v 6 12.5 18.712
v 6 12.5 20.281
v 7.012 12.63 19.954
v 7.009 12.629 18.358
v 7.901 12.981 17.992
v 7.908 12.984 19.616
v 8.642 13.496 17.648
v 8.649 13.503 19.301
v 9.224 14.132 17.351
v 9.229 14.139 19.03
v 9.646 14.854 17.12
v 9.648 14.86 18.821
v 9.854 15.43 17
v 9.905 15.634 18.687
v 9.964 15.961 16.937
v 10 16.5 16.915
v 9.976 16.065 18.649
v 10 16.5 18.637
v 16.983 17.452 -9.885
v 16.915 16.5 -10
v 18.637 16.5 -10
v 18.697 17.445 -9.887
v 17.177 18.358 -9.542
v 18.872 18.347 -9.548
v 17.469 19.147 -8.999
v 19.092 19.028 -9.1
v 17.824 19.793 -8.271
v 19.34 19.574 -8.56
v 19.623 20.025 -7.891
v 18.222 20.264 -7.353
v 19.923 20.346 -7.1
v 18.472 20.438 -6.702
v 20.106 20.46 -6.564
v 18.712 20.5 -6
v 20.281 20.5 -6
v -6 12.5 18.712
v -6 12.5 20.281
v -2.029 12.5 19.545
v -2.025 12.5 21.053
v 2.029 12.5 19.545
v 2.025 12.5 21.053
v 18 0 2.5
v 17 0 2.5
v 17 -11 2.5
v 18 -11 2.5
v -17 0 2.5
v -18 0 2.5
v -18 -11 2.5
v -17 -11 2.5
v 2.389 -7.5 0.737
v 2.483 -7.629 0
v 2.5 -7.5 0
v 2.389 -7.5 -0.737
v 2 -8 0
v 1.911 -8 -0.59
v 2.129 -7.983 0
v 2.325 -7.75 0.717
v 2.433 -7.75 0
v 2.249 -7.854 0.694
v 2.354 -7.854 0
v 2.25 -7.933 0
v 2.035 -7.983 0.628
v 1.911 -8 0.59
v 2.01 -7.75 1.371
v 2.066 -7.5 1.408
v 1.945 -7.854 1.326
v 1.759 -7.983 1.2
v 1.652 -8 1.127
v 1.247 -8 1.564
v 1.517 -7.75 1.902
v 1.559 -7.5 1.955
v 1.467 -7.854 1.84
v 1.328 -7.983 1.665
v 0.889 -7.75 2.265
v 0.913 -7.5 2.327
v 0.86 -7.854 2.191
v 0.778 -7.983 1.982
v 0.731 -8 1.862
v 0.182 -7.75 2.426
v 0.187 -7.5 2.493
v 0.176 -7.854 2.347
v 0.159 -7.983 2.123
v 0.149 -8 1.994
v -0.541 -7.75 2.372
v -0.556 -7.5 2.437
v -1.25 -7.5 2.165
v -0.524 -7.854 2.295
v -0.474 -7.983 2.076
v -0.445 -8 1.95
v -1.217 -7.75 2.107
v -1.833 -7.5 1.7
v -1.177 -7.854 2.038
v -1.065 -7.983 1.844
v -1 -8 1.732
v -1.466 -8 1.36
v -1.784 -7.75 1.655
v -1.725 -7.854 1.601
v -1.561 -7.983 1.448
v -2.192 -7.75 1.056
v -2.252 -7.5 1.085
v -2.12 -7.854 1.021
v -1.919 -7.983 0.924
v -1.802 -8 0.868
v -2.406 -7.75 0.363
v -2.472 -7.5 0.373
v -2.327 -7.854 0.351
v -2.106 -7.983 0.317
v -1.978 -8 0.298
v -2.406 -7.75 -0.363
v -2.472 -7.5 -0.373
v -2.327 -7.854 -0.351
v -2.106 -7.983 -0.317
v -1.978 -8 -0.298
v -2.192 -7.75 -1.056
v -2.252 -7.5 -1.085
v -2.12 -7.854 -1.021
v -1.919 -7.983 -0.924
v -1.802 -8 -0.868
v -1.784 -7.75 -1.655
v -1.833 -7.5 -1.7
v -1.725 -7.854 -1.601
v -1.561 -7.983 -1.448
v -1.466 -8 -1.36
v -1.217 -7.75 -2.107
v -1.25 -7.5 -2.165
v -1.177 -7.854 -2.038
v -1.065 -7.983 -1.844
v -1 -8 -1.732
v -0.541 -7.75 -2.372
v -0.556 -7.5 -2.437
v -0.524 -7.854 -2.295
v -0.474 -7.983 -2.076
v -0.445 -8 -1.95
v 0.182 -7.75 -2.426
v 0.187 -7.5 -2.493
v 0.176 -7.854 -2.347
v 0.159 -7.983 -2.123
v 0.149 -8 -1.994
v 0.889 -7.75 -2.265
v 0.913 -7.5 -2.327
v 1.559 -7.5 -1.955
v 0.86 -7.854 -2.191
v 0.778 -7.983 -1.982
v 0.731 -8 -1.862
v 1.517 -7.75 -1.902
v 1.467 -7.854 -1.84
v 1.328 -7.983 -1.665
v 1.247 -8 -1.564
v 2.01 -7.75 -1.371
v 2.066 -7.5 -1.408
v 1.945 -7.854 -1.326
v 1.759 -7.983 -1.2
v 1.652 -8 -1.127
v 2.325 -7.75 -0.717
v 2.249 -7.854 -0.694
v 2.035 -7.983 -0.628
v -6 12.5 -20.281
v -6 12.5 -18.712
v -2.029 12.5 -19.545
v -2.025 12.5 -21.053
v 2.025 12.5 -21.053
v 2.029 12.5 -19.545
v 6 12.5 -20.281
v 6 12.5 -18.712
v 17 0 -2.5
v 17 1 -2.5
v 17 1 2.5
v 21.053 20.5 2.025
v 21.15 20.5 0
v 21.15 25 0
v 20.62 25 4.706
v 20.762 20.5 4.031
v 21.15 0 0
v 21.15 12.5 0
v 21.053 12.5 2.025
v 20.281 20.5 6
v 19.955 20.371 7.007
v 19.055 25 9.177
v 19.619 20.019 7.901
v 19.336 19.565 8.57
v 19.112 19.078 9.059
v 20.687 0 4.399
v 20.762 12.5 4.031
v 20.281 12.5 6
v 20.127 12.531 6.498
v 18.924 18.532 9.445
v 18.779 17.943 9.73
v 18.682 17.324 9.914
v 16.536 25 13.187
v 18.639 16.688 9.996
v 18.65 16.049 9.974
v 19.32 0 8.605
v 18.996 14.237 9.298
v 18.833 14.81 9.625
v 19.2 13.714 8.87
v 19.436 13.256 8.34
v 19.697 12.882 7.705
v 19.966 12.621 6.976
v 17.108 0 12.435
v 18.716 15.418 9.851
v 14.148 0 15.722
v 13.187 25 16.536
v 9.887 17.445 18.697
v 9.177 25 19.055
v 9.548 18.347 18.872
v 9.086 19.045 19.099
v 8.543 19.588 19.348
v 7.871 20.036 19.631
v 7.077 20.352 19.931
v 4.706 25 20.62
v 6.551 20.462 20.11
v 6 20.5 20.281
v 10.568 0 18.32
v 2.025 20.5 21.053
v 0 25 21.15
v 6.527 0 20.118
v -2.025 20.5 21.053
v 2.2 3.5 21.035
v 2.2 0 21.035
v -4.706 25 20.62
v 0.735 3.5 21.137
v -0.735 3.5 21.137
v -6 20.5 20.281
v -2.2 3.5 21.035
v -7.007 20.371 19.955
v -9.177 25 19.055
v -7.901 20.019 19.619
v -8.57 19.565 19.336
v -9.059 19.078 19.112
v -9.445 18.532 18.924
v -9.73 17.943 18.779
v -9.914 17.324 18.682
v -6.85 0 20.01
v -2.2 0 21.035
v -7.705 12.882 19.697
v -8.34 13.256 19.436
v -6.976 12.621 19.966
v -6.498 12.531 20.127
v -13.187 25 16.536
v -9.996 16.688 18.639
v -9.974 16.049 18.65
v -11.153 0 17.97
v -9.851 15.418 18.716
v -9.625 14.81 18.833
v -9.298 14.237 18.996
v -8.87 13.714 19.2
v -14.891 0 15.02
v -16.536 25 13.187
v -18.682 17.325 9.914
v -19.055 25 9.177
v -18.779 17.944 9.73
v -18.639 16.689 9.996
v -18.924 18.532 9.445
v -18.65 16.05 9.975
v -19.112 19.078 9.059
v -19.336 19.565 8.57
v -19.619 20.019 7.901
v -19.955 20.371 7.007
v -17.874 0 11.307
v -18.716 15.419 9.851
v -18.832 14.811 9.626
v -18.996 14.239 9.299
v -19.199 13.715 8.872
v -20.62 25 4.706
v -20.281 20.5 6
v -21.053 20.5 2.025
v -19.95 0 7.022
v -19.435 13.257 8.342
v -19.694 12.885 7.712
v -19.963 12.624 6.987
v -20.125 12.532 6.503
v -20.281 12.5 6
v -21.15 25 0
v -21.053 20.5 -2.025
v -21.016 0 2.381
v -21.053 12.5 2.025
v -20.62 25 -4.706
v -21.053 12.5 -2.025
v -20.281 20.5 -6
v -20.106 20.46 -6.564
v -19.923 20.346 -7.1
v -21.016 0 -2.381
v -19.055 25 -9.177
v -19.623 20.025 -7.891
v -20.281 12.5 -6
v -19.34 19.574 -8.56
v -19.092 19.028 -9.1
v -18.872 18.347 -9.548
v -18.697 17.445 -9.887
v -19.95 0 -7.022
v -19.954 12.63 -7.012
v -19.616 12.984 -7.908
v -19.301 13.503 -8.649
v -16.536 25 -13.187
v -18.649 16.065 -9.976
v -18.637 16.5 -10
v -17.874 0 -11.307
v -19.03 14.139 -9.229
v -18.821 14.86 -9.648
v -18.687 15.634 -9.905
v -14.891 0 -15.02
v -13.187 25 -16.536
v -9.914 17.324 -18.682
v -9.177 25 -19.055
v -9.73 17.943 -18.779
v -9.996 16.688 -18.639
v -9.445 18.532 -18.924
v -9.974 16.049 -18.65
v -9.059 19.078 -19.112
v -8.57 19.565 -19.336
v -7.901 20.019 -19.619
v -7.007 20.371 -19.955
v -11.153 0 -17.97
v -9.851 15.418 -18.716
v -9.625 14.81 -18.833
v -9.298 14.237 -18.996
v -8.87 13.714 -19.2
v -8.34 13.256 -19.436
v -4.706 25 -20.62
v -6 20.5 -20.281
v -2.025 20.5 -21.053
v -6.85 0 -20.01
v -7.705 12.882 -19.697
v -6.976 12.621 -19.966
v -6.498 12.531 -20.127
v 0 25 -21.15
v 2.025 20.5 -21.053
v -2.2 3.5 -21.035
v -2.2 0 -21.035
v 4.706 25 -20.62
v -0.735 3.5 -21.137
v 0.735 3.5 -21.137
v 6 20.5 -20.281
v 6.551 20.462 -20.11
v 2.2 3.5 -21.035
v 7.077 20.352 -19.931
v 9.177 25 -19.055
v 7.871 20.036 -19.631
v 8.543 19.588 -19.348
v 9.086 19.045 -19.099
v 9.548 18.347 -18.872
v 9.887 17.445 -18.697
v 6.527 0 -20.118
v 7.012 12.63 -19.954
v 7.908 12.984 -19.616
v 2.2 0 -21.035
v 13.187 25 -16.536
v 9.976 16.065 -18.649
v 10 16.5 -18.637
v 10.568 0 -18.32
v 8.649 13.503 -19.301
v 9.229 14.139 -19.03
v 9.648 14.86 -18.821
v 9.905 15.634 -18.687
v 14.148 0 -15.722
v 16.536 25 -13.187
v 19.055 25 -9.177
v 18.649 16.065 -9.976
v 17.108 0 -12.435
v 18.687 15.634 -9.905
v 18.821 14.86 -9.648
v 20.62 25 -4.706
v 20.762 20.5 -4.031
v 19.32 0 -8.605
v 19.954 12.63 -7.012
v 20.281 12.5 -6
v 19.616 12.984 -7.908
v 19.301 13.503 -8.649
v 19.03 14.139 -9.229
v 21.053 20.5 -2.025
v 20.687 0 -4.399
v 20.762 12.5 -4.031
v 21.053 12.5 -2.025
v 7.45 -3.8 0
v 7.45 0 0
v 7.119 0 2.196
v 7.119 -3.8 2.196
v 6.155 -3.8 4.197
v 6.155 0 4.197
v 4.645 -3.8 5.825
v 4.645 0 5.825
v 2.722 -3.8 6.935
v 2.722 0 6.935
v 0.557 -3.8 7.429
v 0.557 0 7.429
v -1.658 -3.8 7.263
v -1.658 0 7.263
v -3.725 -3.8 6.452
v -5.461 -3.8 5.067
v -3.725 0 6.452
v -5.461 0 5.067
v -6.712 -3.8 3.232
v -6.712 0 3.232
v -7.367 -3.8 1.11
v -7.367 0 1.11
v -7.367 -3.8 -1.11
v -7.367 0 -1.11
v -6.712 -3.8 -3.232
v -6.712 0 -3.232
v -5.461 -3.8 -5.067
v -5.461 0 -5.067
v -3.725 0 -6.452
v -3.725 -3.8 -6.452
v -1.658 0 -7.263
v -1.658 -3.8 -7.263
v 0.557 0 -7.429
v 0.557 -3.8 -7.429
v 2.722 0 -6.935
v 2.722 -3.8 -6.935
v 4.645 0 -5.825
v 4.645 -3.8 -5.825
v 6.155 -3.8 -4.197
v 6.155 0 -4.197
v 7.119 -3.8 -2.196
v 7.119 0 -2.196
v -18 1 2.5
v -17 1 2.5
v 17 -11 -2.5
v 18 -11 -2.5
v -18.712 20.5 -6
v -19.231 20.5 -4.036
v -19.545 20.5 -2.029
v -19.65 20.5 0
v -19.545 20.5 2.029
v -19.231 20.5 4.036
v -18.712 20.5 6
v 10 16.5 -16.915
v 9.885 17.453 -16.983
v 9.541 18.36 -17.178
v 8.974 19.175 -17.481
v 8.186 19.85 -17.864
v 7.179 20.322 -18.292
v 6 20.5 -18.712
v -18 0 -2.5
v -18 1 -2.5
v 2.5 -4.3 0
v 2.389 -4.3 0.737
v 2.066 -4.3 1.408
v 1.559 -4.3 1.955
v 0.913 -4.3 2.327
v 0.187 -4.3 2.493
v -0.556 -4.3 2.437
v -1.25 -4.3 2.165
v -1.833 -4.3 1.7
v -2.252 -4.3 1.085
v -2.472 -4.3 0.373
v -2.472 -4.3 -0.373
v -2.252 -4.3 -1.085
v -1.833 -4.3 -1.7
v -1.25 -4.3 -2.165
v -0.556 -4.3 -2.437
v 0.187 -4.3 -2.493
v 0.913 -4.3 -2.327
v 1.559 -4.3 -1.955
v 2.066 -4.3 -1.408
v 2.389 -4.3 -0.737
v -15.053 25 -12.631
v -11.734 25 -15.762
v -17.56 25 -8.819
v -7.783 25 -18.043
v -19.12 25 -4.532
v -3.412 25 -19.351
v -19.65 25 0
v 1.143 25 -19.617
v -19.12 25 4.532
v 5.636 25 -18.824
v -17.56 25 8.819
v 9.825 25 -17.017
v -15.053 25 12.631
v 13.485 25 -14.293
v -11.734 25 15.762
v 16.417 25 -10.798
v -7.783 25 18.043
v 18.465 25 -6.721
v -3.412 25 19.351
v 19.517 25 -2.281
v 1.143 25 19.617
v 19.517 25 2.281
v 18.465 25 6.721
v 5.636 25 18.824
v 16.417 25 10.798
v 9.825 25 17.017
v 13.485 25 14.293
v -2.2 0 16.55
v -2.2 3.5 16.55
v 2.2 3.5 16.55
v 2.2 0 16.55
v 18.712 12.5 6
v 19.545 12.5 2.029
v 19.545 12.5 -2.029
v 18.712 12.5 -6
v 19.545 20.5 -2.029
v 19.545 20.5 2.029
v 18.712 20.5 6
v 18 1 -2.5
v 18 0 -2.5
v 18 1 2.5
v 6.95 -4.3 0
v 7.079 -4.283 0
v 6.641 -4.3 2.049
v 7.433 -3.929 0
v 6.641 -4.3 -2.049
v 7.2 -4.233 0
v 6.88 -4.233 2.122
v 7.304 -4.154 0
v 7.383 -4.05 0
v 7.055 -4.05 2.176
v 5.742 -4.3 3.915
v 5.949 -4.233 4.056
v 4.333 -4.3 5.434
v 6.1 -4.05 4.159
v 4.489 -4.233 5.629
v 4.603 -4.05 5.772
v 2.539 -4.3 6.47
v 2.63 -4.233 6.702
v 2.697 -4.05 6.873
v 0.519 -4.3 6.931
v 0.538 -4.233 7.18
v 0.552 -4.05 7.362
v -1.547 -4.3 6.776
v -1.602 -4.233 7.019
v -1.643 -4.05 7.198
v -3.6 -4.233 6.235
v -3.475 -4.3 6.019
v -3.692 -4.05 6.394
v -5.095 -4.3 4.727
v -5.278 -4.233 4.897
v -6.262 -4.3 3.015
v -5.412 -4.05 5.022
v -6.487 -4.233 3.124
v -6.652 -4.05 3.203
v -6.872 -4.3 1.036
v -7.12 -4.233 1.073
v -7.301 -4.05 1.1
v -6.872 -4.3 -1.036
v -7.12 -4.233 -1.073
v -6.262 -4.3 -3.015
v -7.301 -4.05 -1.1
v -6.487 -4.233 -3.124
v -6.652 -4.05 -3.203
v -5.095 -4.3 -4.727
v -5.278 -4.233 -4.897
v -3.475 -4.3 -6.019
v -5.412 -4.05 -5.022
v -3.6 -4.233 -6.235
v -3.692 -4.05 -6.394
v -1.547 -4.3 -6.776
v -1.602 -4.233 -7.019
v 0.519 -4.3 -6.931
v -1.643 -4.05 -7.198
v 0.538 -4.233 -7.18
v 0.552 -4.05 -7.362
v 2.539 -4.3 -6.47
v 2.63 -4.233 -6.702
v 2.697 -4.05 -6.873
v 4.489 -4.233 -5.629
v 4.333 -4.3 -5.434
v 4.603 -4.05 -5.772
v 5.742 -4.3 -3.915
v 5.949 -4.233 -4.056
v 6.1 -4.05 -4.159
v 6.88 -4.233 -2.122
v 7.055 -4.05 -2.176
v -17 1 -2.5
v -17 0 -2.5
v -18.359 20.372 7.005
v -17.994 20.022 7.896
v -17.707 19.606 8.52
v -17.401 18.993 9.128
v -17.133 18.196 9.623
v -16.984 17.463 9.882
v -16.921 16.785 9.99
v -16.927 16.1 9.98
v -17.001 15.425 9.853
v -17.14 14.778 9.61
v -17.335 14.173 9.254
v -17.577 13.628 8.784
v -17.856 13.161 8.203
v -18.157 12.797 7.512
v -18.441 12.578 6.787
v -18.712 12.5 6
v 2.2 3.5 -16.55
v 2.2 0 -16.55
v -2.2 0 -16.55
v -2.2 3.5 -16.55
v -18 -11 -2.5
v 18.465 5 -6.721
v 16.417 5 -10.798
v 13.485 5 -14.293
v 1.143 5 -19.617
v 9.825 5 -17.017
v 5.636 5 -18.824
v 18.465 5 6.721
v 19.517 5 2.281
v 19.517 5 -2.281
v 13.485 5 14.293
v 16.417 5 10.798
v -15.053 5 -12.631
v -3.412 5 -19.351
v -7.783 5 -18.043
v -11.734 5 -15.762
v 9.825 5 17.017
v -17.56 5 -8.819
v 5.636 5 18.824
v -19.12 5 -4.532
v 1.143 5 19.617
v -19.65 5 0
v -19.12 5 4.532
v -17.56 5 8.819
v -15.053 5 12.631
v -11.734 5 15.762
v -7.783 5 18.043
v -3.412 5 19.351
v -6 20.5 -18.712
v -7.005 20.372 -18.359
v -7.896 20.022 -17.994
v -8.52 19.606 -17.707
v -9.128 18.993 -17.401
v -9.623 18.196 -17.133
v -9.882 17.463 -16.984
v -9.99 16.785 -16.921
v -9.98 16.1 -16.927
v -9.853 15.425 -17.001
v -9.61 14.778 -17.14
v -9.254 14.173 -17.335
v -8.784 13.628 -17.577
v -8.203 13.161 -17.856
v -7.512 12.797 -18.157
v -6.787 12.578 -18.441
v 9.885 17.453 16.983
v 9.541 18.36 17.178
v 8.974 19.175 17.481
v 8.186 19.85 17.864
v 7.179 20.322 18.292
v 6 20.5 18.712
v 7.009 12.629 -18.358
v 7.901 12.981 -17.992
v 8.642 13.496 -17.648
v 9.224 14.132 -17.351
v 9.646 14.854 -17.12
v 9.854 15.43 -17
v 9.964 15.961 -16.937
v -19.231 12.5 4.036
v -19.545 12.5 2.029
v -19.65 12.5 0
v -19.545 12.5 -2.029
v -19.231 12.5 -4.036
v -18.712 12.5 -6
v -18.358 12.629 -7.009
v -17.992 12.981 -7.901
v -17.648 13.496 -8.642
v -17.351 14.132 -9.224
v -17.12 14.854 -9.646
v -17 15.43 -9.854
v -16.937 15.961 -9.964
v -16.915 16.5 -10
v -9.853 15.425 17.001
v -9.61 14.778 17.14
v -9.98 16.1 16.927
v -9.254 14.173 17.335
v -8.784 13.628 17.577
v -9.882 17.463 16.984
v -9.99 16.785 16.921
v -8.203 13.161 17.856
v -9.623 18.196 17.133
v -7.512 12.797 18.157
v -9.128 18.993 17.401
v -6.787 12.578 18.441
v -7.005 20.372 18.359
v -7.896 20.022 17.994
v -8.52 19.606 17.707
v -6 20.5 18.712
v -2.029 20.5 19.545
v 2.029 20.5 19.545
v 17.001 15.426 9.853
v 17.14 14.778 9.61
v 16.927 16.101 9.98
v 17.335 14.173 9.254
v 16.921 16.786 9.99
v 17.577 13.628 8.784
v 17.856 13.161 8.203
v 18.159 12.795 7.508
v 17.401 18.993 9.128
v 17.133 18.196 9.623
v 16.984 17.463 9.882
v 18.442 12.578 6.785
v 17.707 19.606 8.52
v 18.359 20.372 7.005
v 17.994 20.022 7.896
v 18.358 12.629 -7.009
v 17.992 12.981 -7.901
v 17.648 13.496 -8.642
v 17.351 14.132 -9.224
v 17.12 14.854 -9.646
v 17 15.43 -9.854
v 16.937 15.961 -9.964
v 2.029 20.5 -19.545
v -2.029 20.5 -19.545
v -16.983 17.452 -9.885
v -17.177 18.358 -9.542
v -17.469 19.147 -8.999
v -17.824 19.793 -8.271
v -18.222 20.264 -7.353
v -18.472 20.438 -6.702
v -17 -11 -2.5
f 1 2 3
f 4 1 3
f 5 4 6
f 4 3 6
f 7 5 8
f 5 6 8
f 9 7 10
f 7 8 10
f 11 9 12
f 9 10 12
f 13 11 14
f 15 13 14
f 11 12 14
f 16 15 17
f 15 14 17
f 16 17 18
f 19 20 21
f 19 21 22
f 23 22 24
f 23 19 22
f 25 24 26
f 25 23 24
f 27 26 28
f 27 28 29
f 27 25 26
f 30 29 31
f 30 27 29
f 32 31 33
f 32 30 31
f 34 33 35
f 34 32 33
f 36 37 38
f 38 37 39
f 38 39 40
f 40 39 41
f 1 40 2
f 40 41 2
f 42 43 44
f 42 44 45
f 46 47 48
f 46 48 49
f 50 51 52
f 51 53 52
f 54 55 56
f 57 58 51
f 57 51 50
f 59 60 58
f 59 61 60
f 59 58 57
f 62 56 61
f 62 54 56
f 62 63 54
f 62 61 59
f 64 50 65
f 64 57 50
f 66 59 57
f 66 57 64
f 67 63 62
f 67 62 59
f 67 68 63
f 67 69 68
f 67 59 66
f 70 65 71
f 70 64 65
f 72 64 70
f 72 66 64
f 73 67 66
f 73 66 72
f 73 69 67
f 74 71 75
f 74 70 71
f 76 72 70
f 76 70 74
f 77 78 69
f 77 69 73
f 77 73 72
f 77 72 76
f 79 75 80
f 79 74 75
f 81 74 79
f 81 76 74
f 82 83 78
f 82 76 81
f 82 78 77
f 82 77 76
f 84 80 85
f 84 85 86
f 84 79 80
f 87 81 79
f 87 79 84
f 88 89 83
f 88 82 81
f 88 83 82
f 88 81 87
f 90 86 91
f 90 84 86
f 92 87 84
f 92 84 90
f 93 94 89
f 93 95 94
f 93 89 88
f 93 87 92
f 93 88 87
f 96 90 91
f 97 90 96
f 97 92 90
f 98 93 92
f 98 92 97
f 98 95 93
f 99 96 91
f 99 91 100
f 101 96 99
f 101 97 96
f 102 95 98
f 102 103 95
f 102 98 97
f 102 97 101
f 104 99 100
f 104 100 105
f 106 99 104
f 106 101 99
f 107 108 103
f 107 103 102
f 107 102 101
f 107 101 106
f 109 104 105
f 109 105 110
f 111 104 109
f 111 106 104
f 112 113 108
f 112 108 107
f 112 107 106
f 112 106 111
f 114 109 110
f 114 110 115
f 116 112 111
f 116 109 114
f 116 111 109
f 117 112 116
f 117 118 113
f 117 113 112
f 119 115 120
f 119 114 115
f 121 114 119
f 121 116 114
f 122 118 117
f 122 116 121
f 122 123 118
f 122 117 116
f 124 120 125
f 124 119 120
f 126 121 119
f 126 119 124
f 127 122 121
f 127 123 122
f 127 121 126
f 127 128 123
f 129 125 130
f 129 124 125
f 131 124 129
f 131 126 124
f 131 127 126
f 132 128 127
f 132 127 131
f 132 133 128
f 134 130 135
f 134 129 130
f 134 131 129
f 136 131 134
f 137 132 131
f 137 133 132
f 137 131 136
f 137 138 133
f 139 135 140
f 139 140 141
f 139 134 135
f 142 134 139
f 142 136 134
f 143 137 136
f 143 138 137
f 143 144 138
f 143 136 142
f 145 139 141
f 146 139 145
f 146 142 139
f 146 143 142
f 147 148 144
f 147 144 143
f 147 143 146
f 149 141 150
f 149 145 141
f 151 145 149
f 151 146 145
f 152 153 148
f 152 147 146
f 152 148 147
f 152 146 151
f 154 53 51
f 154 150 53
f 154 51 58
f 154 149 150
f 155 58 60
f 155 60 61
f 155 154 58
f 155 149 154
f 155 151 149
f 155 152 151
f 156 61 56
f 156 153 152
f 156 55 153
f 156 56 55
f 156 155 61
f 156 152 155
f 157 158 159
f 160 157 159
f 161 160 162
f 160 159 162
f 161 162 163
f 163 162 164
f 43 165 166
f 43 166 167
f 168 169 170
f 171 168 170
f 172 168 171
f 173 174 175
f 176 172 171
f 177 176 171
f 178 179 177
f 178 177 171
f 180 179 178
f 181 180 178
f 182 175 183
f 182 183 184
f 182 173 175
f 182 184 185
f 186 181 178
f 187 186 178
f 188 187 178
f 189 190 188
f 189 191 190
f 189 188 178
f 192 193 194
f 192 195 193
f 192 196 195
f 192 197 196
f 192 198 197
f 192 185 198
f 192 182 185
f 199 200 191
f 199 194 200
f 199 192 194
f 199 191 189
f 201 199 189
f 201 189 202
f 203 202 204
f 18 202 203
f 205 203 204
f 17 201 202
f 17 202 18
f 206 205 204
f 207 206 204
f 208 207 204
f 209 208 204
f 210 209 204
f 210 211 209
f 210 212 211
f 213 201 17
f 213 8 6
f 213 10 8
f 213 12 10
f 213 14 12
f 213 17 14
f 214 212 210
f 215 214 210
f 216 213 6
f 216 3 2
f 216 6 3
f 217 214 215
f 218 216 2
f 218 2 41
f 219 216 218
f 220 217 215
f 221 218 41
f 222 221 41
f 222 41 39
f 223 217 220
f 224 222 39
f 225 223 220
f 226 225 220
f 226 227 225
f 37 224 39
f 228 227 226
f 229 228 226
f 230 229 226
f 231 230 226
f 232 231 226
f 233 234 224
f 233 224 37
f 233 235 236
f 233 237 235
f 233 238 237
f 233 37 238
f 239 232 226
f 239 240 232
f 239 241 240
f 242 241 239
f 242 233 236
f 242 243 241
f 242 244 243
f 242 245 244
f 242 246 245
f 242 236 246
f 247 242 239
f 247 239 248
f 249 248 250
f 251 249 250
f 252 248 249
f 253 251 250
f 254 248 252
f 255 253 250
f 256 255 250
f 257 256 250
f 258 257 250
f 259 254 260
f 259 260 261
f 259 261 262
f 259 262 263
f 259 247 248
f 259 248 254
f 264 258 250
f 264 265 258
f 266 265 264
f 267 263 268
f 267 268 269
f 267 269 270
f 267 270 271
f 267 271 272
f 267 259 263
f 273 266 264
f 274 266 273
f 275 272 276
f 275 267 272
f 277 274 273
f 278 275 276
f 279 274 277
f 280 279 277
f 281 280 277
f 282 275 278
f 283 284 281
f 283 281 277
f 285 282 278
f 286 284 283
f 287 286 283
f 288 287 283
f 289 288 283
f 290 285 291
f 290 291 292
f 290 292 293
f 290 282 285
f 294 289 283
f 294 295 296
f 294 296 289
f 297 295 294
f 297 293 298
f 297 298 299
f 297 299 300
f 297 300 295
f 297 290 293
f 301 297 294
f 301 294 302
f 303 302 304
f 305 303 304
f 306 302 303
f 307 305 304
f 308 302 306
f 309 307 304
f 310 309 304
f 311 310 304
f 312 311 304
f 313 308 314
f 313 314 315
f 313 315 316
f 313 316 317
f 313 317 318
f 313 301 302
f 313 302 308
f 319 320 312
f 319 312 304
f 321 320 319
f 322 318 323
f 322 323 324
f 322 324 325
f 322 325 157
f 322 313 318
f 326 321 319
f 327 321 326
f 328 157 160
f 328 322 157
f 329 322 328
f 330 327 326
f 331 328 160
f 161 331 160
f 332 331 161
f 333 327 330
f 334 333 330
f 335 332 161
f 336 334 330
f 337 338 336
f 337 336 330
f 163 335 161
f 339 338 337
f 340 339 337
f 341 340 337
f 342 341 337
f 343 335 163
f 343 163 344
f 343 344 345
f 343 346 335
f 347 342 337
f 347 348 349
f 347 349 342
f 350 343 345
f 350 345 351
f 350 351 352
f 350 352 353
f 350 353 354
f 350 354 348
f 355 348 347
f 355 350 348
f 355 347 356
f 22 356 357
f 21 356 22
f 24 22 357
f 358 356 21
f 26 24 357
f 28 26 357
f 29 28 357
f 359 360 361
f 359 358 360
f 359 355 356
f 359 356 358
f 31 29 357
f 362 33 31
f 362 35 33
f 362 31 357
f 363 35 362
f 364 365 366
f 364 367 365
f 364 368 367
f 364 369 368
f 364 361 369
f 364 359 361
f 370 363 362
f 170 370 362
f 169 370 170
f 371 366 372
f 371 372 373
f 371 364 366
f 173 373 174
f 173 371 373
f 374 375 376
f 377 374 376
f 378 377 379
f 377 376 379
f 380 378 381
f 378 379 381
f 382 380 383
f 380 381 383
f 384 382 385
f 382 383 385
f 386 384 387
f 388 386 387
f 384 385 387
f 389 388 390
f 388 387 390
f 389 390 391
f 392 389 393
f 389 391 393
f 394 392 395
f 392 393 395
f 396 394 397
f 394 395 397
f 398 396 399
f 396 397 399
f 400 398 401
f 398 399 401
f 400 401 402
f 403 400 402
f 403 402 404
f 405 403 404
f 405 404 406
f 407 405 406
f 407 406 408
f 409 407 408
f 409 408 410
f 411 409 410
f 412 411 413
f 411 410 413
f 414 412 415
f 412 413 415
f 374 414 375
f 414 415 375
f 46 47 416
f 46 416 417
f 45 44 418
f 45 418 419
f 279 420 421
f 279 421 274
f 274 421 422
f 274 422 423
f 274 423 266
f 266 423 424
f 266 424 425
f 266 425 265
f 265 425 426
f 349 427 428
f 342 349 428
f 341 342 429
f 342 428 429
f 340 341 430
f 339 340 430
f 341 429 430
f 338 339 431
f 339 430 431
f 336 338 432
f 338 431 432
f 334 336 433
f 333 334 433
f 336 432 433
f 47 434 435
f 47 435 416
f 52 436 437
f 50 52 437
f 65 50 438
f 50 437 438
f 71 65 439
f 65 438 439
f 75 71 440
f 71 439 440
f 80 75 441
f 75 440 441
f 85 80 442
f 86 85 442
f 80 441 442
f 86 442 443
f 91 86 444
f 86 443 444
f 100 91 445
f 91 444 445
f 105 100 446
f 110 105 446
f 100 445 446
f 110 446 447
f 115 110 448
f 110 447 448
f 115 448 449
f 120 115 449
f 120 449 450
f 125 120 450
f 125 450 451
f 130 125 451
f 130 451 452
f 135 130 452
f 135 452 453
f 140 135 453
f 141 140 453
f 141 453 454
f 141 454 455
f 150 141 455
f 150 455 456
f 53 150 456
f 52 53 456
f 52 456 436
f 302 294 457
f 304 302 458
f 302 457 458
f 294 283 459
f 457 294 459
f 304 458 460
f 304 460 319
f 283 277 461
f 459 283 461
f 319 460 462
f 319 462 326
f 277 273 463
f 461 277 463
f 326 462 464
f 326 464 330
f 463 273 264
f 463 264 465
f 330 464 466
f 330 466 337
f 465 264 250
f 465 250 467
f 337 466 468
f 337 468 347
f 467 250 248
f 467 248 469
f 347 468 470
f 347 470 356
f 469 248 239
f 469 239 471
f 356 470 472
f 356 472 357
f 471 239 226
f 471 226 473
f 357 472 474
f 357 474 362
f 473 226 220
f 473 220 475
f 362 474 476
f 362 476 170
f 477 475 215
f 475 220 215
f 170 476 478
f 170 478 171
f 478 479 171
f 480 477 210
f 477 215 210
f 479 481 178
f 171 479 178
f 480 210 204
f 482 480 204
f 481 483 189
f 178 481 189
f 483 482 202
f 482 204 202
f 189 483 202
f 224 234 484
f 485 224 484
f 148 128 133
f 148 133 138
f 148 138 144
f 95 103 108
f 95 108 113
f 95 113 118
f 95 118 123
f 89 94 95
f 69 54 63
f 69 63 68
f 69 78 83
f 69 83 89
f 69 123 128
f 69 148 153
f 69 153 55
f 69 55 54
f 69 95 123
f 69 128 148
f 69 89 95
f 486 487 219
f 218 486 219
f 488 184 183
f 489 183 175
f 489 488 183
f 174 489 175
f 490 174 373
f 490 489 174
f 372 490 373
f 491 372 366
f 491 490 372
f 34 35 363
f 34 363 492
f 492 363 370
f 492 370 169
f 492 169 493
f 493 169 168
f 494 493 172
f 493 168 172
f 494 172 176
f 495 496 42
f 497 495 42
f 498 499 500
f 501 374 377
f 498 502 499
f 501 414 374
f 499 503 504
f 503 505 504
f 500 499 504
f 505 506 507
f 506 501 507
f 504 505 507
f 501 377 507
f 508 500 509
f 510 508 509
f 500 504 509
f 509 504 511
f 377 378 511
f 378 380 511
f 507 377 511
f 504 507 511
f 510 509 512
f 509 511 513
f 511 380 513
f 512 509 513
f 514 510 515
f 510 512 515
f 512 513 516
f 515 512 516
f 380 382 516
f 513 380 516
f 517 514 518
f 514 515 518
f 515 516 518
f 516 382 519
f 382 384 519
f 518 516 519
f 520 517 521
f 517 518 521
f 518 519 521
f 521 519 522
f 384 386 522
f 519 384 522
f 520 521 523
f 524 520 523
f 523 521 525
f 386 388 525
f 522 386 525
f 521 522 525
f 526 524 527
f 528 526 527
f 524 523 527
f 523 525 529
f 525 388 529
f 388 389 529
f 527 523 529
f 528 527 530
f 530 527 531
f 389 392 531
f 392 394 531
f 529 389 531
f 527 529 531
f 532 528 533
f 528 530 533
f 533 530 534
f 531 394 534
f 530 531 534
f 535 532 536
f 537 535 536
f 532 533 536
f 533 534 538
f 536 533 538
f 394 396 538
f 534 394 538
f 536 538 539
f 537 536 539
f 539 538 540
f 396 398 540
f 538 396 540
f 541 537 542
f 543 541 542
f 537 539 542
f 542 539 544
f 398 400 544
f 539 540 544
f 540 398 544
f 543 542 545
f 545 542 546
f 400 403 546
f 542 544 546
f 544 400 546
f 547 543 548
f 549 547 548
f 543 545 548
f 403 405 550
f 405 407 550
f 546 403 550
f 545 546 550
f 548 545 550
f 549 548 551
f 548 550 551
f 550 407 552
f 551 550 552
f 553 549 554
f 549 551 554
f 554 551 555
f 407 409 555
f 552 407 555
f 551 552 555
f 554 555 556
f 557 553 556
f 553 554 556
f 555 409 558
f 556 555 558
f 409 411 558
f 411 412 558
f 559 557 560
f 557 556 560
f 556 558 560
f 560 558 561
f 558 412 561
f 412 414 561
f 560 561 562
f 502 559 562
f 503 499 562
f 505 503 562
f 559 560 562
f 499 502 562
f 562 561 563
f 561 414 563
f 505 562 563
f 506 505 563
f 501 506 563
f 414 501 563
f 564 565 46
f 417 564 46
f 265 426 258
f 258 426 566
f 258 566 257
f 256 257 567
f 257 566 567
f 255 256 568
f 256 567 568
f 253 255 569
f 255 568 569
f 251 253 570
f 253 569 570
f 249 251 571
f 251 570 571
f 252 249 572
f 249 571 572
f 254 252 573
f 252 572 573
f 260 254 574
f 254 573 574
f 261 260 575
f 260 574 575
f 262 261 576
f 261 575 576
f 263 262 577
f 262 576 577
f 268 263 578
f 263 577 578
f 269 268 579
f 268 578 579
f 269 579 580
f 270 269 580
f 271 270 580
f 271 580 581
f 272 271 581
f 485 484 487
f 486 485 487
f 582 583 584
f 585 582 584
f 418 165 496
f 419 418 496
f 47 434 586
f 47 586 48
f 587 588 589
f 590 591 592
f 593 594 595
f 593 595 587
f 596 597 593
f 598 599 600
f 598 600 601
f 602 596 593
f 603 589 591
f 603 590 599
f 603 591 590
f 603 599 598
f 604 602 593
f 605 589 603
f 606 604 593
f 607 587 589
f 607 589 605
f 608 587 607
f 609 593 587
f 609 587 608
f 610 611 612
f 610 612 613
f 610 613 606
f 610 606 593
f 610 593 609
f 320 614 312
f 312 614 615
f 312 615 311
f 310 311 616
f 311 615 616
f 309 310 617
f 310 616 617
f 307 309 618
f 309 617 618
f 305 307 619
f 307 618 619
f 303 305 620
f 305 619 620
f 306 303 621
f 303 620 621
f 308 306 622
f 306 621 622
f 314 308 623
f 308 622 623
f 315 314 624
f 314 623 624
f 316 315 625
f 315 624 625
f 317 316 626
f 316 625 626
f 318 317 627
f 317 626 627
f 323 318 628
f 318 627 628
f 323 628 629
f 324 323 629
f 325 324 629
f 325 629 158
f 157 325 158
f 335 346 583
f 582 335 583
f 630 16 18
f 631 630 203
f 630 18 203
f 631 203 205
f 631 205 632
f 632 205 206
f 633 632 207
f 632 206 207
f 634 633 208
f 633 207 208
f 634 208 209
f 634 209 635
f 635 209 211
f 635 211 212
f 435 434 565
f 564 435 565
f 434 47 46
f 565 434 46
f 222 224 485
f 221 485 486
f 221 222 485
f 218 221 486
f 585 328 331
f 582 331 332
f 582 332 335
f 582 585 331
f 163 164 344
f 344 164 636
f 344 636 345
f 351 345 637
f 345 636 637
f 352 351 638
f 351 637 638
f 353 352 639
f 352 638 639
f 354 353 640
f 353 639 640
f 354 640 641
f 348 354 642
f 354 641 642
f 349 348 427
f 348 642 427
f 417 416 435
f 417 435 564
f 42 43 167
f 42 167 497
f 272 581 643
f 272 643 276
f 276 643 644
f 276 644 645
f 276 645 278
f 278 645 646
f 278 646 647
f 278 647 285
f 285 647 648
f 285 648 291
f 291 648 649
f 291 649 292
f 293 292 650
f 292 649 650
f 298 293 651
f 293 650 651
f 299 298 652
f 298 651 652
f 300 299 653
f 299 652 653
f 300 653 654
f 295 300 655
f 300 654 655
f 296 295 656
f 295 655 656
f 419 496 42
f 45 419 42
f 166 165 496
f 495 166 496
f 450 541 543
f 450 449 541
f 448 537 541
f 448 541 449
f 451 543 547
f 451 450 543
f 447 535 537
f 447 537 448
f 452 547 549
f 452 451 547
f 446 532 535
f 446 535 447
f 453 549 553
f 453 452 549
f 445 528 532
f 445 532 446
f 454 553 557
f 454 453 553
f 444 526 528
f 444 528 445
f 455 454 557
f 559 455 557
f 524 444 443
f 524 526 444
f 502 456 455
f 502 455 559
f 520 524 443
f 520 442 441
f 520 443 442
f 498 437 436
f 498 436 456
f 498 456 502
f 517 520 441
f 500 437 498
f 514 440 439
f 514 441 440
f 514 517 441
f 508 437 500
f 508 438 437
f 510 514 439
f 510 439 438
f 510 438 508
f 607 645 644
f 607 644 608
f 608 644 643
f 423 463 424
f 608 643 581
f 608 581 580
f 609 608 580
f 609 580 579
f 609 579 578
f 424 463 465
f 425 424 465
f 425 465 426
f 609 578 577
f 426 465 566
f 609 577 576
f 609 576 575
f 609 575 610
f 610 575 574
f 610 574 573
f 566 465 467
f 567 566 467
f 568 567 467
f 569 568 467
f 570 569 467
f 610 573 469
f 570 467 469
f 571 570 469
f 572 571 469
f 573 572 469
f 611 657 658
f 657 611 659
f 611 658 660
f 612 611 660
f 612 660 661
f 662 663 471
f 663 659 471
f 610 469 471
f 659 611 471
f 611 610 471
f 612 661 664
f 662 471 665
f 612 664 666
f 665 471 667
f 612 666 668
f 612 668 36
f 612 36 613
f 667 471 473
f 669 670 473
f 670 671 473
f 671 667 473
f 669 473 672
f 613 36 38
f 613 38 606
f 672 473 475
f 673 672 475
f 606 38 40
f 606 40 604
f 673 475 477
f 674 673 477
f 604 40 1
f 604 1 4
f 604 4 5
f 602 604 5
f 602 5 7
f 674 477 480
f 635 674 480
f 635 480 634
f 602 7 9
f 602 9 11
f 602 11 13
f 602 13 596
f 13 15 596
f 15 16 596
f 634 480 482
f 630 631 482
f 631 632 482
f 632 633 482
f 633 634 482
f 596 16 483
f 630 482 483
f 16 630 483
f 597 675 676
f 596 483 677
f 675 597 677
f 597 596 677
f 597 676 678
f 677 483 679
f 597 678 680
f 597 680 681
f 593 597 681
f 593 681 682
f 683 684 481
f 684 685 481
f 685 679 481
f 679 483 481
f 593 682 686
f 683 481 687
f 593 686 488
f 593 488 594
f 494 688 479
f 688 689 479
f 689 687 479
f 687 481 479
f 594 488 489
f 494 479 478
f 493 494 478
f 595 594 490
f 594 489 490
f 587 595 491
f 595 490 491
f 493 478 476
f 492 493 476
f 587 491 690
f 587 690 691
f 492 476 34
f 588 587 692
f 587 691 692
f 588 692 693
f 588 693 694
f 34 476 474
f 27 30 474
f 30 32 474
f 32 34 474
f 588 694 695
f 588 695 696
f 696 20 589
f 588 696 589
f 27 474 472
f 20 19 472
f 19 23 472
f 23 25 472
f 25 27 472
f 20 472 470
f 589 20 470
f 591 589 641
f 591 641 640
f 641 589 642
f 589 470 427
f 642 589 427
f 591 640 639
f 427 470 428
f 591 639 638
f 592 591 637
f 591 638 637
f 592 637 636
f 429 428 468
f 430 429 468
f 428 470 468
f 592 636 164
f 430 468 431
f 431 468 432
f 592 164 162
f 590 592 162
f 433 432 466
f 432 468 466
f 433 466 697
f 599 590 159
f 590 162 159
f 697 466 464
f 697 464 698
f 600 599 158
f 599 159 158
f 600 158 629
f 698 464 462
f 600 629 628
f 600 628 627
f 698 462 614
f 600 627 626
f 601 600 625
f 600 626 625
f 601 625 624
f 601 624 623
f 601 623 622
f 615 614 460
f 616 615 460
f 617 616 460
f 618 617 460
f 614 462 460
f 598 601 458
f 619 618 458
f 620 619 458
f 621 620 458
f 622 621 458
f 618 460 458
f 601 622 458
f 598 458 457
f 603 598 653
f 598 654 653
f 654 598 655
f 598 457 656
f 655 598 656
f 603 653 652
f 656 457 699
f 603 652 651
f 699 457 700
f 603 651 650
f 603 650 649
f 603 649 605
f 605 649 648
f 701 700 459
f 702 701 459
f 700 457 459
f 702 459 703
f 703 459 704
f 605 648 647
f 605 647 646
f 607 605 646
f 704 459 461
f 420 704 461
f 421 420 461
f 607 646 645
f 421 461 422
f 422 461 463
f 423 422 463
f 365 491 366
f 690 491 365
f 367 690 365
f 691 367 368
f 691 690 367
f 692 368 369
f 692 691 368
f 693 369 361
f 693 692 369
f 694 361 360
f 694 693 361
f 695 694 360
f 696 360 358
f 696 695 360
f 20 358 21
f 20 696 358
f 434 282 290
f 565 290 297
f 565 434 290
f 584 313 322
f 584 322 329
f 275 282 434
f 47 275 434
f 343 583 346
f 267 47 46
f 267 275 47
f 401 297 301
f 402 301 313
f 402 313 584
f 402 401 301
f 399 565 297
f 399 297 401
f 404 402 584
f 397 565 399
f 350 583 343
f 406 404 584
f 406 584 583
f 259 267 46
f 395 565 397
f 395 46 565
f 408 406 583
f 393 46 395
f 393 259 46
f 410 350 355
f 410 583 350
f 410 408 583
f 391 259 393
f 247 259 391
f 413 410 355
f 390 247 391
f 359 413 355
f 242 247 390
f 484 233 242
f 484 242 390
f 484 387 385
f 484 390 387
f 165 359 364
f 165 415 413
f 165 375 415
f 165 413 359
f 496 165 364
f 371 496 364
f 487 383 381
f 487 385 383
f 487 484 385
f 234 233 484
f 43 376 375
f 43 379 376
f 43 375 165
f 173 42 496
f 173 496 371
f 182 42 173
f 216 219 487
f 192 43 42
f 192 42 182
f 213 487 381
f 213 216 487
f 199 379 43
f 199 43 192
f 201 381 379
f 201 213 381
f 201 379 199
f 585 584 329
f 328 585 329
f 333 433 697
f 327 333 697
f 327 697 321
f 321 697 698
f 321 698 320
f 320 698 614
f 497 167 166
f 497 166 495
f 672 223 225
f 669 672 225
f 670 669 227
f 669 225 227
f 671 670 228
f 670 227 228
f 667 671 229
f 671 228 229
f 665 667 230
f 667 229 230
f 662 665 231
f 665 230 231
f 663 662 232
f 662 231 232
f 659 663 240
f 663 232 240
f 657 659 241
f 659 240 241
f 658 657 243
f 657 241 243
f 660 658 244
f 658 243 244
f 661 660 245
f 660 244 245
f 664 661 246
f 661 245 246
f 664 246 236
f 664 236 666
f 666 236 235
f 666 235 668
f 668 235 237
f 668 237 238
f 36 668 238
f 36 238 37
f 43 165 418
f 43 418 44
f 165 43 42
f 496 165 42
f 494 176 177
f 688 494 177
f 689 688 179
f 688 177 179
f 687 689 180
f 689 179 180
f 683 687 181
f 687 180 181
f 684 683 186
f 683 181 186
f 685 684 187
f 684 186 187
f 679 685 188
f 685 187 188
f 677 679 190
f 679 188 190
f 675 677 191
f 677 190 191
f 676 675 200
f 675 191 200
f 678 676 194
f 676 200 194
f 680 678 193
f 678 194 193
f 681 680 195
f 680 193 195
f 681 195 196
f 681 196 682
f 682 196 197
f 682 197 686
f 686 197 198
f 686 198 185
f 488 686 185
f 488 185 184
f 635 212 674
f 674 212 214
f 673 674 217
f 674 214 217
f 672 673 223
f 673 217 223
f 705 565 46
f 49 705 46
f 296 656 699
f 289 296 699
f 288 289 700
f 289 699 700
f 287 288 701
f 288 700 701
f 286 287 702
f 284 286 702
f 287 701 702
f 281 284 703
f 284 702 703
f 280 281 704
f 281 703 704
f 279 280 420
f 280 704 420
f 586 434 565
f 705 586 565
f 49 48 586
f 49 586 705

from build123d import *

# Parameters (mm, degrees)
F0_W      = 1
F0_H      = 5
F1_DEPTH  = 11
F0_R      = 21.15
F2_DEPTH  = 25
F3_R      = 19.65
F4_DEPTH  = 20
F6_DEPTH  = 22.5
F8_DEPTH  = 22.5
F10_DEPTH = 3.5
F11_R     = 7.45
F11_R_2   = 2.5
F12_DEPTH = 4.3
F13_DEPTH = 8
F14_R     = 0.5
F15_DEPTH = 1


with BuildPart() as f1:
    # F0 (on Front) → F1 (new body)
    with BuildSketch(Plane.XZ):
        with Locations((-17.5, 0)):
            Rectangle(F0_W, F0_H)
    extrude(amount=F1_DEPTH)


with BuildPart() as f1b:
    # F0 (on Front) → F1, piece 2 (new body)
    with BuildSketch(Plane.XZ):
        with Locations((17.5, 0)):
            Rectangle(F0_W, F0_H)
    extrude(amount=F1_DEPTH)


with BuildPart() as f2:
    # F0 (on Front) → F2 (new body)
    with BuildSketch(Plane.XZ):
        Circle(F0_R)
        with Locations((-17.5, 0)):
            Rectangle(F0_W, F0_H, mode=Mode.SUBTRACT)
        with Locations((17.5, 0)):
            Rectangle(F0_W, F0_H, mode=Mode.SUBTRACT)
        with Locations((-17.5, 0)):
            Rectangle(F0_W, F0_H)
        with Locations((17.5, 0)):
            Rectangle(F0_W, F0_H)
    extrude(amount=-F2_DEPTH)

    # F3 (on face) → F4 (cut)
    with BuildSketch(Plane(origin=(0, 25, 0), x_dir=(-1, 0, 0), z_dir=(0, 1, 0))):
        Circle(F3_R)
    extrude(amount=-F4_DEPTH, mode=Mode.SUBTRACT)

    # F5 (on Right) → F6 (cut, symmetric)
    with BuildSketch(Plane.YZ):
        with BuildLine():
            ThreePointArc((20.5, 6), (19.3284271247, 8.8284271247), (16.5, 10))
            ThreePointArc((16.5, 10), (13.6715728753, 8.8284271247), (12.5, 6))
            Line((12.5, 6), (12.5, -6))
            ThreePointArc((12.5, -6), (13.6715728753, -8.8284271247), (16.5, -10))
            ThreePointArc((16.5, -10), (19.3284271247, -8.8284271247), (20.5, -6))
            Line((20.5, -6), (20.5, 6))
        make_face()
    extrude(amount=F6_DEPTH, both=True, mode=Mode.SUBTRACT)

    # F7 (on Top) → F8 (cut, symmetric)
    with BuildSketch(Plane.XY):
        with BuildLine():
            Line((6, 20.5), (-6, 20.5))
            ThreePointArc((-6, 20.5), (-8.8284271247, 19.3284271247), (-10, 16.5))
            ThreePointArc((-10, 16.5), (-8.8284271247, 13.6715728753), (-6, 12.5))
            Line((-6, 12.5), (6, 12.5))
            ThreePointArc((6, 12.5), (8.8284271247, 13.6715728753), (10, 16.5))
            ThreePointArc((10, 16.5), (8.8284271247, 19.3284271247), (6, 20.5))
        make_face()
    extrude(amount=F8_DEPTH, both=True, mode=Mode.SUBTRACT)

    # F9 (on face) → F10 (cut)
    with BuildSketch(Plane.XZ):
        with BuildLine():
            ThreePointArc((2.2, 21.035268004), (0, 21.15), (-2.2, 21.035268004))
            Line((-2.2, 21.035268004), (-2.2, 16.55))
            Line((-2.2, 16.55), (2.2, 16.55))
            Line((2.2, 16.55), (2.2, 21.035268004))
        make_face()
        with BuildLine():
            Line((2.2, -16.55), (-2.2, -16.55))
            Line((-2.2, -16.55), (-2.2, -21.035268004))
            ThreePointArc((-2.2, -21.035268004), (0, -21.15), (2.2, -21.035268004))
            Line((2.2, -21.035268004), (2.2, -16.55))
        make_face()
    extrude(amount=-F10_DEPTH, mode=Mode.SUBTRACT)

    # F11 (on face) → F12 (join)
    with BuildSketch(Plane.XZ):
        Circle(F11_R)
        Circle(F11_R_2, mode=Mode.SUBTRACT)
    extrude(amount=F12_DEPTH)

    # F13 (add): a face of the model
    f13_faces = [f2.faces().sort_by_distance(p)[0] for p in [
        (0, 0, 0),
    ]]
    extrude(f13_faces, amount=F13_DEPTH)

    # F14
    f14_edges = [f2.edges().sort_by_distance(p)[0] for p in [
        (-7.45, -4.3, 0),
        (-2.5, -8, 0),
    ]]
    fillet(f14_edges, radius=F14_R)

    # F0 (on Front) → F15 (cut)
    with BuildSketch(Plane.XZ):
        with Locations((-17.5, 0)):
            Rectangle(F0_W, F0_H)
        with Locations((17.5, 0)):
            Rectangle(F0_W, F0_H)
    extrude(amount=-F15_DEPTH, mode=Mode.SUBTRACT)


solid = Compound([f1.part, f1b.part, f2.part])
